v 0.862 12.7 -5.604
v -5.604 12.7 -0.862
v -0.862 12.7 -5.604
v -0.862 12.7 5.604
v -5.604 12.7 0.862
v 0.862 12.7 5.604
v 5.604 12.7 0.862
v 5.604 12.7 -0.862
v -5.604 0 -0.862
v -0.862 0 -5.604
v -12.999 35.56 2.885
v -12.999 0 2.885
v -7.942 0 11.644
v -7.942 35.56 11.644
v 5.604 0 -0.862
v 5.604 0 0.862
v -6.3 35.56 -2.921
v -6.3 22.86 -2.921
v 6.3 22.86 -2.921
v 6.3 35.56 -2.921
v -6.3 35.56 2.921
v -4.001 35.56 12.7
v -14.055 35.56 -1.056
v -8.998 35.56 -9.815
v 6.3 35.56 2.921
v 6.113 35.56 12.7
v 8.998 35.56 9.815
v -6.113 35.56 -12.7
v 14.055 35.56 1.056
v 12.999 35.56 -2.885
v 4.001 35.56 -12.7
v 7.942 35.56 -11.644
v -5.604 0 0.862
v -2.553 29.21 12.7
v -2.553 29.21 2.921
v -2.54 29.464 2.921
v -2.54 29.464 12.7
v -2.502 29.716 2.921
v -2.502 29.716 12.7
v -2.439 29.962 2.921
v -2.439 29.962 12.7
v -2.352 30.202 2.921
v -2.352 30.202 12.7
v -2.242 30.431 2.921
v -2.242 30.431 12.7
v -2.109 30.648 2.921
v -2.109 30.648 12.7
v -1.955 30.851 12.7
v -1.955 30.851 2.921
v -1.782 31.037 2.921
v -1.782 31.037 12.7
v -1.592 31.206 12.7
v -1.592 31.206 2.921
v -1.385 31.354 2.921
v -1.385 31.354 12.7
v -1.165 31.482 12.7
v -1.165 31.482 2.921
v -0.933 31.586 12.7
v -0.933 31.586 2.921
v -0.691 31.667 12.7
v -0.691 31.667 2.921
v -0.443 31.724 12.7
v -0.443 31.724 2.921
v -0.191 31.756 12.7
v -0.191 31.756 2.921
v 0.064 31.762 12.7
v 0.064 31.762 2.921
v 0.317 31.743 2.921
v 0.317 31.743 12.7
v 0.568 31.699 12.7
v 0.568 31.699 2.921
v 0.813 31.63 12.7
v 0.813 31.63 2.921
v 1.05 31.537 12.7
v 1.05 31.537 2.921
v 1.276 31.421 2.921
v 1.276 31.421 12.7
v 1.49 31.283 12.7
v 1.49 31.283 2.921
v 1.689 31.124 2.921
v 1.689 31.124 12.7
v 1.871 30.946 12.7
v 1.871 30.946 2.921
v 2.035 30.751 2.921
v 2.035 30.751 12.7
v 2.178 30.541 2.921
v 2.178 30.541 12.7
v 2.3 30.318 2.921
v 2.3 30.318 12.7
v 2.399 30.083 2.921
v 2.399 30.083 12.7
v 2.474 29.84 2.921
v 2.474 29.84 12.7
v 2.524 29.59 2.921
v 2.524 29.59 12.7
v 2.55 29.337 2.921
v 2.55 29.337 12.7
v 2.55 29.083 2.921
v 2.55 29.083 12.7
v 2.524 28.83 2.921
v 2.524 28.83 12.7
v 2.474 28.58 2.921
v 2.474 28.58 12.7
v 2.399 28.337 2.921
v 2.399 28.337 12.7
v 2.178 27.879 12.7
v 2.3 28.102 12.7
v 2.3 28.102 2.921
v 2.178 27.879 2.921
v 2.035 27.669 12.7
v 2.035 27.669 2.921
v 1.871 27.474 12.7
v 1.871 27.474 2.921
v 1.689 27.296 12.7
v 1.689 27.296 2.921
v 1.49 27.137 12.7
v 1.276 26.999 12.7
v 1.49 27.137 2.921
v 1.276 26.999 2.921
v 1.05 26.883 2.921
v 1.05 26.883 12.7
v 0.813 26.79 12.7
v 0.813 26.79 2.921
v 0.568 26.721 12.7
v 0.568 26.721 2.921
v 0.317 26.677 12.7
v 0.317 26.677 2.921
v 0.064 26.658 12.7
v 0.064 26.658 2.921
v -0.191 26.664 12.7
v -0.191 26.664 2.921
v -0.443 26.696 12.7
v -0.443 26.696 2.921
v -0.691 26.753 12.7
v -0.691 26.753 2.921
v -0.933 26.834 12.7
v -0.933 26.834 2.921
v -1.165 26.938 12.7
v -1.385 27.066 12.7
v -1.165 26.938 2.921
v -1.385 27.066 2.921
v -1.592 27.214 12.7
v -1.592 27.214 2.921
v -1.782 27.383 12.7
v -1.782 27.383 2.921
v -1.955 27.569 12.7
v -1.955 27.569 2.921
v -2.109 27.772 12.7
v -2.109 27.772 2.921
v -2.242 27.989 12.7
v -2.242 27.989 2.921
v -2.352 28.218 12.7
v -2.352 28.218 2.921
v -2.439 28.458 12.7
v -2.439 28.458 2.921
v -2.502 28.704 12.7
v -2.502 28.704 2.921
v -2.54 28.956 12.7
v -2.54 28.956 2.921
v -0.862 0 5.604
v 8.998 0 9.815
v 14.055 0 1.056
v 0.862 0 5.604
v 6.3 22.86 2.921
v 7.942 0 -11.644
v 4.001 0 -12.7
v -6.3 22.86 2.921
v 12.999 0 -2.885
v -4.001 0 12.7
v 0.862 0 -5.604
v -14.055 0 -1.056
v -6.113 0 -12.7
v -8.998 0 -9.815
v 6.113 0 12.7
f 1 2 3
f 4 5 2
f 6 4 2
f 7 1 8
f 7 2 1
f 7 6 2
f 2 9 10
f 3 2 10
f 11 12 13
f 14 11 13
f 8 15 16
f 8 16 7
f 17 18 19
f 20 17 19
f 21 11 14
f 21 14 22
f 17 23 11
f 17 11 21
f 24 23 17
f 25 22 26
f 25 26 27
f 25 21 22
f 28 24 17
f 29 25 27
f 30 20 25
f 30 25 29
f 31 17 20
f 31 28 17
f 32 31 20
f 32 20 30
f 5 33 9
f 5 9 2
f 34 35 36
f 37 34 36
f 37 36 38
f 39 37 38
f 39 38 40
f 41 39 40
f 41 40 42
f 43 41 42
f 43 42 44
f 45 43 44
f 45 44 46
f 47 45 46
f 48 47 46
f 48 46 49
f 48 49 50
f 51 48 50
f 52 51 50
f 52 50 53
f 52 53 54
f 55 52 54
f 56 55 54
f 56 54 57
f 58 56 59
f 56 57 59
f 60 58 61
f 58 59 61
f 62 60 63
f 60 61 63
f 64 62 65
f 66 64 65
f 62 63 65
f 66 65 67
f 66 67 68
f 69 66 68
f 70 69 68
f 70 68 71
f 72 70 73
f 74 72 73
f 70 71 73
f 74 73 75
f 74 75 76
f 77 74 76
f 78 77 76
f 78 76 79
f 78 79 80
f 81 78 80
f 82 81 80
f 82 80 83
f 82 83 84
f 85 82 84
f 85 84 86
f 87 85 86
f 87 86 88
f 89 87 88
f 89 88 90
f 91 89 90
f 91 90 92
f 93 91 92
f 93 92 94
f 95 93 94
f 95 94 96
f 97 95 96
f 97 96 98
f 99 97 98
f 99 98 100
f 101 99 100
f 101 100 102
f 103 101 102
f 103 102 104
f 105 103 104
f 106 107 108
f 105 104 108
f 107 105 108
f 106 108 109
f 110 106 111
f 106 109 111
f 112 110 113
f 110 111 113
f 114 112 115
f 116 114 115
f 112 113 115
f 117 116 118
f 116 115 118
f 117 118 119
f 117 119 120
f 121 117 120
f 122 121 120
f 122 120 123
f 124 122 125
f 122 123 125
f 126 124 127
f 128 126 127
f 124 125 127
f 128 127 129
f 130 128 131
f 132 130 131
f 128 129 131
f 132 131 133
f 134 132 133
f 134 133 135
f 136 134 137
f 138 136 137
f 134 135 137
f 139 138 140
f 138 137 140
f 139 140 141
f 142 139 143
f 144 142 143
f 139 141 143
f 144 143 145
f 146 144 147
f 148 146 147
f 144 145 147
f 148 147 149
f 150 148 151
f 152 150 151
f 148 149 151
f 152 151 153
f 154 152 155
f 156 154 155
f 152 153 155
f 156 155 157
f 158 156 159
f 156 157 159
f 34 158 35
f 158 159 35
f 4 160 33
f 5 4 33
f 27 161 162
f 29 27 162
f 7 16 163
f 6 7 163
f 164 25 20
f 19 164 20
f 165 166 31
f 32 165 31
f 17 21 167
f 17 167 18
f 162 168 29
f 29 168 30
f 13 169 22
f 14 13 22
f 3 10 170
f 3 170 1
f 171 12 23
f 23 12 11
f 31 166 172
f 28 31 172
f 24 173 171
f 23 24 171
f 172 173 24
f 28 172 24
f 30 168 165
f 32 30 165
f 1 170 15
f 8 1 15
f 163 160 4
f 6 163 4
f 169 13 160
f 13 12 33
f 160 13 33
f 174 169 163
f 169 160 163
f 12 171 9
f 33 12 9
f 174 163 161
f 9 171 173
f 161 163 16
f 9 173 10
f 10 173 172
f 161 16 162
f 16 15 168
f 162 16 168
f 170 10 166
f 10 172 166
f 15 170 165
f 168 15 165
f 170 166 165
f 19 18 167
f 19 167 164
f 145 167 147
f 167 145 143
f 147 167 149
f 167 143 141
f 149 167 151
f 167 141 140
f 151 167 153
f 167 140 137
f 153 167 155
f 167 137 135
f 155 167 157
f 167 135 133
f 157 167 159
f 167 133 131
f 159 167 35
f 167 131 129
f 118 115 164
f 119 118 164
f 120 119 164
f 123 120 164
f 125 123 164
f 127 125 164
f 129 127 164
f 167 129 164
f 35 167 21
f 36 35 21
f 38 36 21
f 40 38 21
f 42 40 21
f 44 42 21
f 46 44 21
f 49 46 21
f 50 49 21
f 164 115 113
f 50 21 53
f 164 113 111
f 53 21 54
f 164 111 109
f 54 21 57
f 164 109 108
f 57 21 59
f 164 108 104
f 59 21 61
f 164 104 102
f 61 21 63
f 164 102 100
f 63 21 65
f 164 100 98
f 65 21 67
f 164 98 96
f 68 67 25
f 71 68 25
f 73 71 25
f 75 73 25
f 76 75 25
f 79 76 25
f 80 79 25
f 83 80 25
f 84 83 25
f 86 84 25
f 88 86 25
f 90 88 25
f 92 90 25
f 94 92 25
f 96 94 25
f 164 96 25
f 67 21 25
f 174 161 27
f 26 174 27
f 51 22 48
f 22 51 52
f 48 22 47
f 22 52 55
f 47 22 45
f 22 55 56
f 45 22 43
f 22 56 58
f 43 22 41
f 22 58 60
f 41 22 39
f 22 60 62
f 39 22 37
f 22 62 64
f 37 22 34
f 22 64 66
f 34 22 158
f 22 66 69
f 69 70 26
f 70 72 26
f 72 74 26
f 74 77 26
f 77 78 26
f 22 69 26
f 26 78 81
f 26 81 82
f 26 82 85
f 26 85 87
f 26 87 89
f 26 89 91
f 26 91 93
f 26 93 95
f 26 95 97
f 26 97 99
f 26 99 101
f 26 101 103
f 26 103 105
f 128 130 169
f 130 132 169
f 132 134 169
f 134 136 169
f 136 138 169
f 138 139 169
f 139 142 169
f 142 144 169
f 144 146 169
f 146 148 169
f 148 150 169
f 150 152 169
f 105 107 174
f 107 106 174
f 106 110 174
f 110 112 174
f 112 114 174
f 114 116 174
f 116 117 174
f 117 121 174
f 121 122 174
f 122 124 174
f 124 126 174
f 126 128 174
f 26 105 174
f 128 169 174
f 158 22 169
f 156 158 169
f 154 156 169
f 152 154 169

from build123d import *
from OCP.BRepFilletAPI import BRepFilletAPI_MakeChamfer

# Parameters (mm, degrees)
BOSS_EXTRUDE1_DEPTH         = 35.56
SKETCH2_W                   = 12.59949555
SKETCH2_H                   = 5.842
CUT_EXTRUDE1_DEPTH          = 12.7
CUT_EXTRUDE2_DEPTH          = 12.7
F_1_4_20_TAPPED_HOLE1_D     = 5.1054
F_1_4_20_TAPPED_HOLE1_DEPTH = 14.086183098
F_1_4_20_TAPPED_HOLE1_TIP   = 1.533816902
CHAMFER1_SIZE               = 1.2192
CHAMFER1_SIZE2              = 3.330916345


with BuildPart() as part:
    # Sketch1 → Boss-Extrude1 (new body)
    with BuildSketch(Plane(origin=(0, 0, 0), x_dir=(1, 0, 0), z_dir=(0, 1, 0))):
        Polygon((-14.664696837, 0), (-7.332348419, -12.7), (7.332348419, -12.7), (14.664696837, 0), (7.332348419, 12.7), (-7.332348419, 12.7), align=None)
    extrude(amount=BOSS_EXTRUDE1_DEPTH)

    # Sketch2 → Cut-Extrude1 (cut)
    with BuildSketch(Plane(origin=(0, 35.56, 0), x_dir=(1, 0, 0), z_dir=(0, 1, 0))):
        Rectangle(SKETCH2_W, SKETCH2_H)
    extrude(amount=-CUT_EXTRUDE1_DEPTH, mode=Mode.SUBTRACT)

    # Sketch3 → Cut-Extrude2 (cut)
    with BuildSketch(Plane.XZ):
        Polygon((0, 6.465784407), (-6.465784407, 0), (0, -6.465784407), (6.465784407, 0), align=None)
    extrude(amount=-CUT_EXTRUDE2_DEPTH, mode=Mode.SUBTRACT)

    # 1/4-20 Tapped Hole1
    with Locations(Plane.XY.offset(12.7)):
        with Locations((0, 29.21)):
            Hole(F_1_4_20_TAPPED_HOLE1_D / 2, depth=F_1_4_20_TAPPED_HOLE1_DEPTH)
            with Locations((0, 0, -(F_1_4_20_TAPPED_HOLE1_DEPTH + F_1_4_20_TAPPED_HOLE1_TIP / 2))):  # 118° drill point
                Cone(0, F_1_4_20_TAPPED_HOLE1_D / 2, F_1_4_20_TAPPED_HOLE1_TIP, mode=Mode.SUBTRACT)

    # Chamfer1: one chamfer whose edges measure the first distance from different faces: ONE call of the kernel's chamfer builder (chamfer() names one face for all edges)
    chamfer1_edges_1 = [part.edges().sort_by_distance(p)[0] for p in [
        (-7.332348419, 17.78, -12.7),
    ]]
    chamfer1_side_1 = [part.faces().sort_by_distance(p)[0] for p in [
        (0, 17.78, -12.7),
    ]]
    chamfer1_edges_2 = [part.edges().sort_by_distance(p)[0] for p in [
        (7.332348419, 17.78, -12.7),
    ]]
    chamfer1_side_2 = [part.faces().sort_by_distance(p)[0] for p in [
        (10.998522628, 17.78, -6.35),
    ]]
    chamfer1_edges_3 = [part.edges().sort_by_distance(p)[0] for p in [
        (14.664696837, 17.78, 0),
    ]]
    chamfer1_side_3 = [part.faces().sort_by_distance(p)[0] for p in [
        (10.998522628, 17.78, 6.35),
    ]]
    chamfer1_edges_4 = [part.edges().sort_by_distance(p)[0] for p in [
        (7.332348419, 17.78, 12.7),
    ]]
    chamfer1_side_4 = [part.faces().sort_by_distance(p)[0] for p in [
        (0, 17.312960636, 12.7),
    ]]
    chamfer1_edges_5 = [part.edges().sort_by_distance(p)[0] for p in [
        (-7.332348419, 17.78, 12.7),
    ]]
    chamfer1_side_5 = [part.faces().sort_by_distance(p)[0] for p in [
        (-10.998522628, 17.78, 6.35),
    ]]
    chamfer1_edges_6 = [part.edges().sort_by_distance(p)[0] for p in [
        (-14.664696837, 17.78, 0),
    ]]
    chamfer1_side_6 = [part.faces().sort_by_distance(p)[0] for p in [
        (-10.998522628, 17.78, -6.35),
    ]]
    chamfer1_edges_7 = [part.edges().sort_by_distance(p)[0] for p in [
        (0, 6.35, -6.465784407),
        (-6.465784407, 6.35, 0),
        (0, 6.35, 6.465784407),
        (6.465784407, 6.35, 0),
    ]]
    chamfer1 = BRepFilletAPI_MakeChamfer(part.part.solid().wrapped)
    for e in chamfer1_edges_1:
        chamfer1.Add(CHAMFER1_SIZE, CHAMFER1_SIZE2, e.wrapped, chamfer1_side_1[0].wrapped)  # the first distance lies on this face
    for e in chamfer1_edges_2:
        chamfer1.Add(CHAMFER1_SIZE, CHAMFER1_SIZE2, e.wrapped, chamfer1_side_2[0].wrapped)  # the first distance lies on this face
    for e in chamfer1_edges_3:
        chamfer1.Add(CHAMFER1_SIZE, CHAMFER1_SIZE2, e.wrapped, chamfer1_side_3[0].wrapped)  # the first distance lies on this face
    for e in chamfer1_edges_4:
        chamfer1.Add(CHAMFER1_SIZE, CHAMFER1_SIZE2, e.wrapped, chamfer1_side_4[0].wrapped)  # the first distance lies on this face
    for e in chamfer1_edges_5:
        chamfer1.Add(CHAMFER1_SIZE, CHAMFER1_SIZE2, e.wrapped, chamfer1_side_5[0].wrapped)  # the first distance lies on this face
    for e in chamfer1_edges_6:
        chamfer1.Add(CHAMFER1_SIZE, CHAMFER1_SIZE2, e.wrapped, chamfer1_side_6[0].wrapped)  # the first distance lies on this face
    for e in chamfer1_edges_7:
        chamfer1.Add(CHAMFER1_SIZE, e.wrapped)
    add(Compound.cast(chamfer1.Shape()), mode=Mode.REPLACE)


solid = part.part
